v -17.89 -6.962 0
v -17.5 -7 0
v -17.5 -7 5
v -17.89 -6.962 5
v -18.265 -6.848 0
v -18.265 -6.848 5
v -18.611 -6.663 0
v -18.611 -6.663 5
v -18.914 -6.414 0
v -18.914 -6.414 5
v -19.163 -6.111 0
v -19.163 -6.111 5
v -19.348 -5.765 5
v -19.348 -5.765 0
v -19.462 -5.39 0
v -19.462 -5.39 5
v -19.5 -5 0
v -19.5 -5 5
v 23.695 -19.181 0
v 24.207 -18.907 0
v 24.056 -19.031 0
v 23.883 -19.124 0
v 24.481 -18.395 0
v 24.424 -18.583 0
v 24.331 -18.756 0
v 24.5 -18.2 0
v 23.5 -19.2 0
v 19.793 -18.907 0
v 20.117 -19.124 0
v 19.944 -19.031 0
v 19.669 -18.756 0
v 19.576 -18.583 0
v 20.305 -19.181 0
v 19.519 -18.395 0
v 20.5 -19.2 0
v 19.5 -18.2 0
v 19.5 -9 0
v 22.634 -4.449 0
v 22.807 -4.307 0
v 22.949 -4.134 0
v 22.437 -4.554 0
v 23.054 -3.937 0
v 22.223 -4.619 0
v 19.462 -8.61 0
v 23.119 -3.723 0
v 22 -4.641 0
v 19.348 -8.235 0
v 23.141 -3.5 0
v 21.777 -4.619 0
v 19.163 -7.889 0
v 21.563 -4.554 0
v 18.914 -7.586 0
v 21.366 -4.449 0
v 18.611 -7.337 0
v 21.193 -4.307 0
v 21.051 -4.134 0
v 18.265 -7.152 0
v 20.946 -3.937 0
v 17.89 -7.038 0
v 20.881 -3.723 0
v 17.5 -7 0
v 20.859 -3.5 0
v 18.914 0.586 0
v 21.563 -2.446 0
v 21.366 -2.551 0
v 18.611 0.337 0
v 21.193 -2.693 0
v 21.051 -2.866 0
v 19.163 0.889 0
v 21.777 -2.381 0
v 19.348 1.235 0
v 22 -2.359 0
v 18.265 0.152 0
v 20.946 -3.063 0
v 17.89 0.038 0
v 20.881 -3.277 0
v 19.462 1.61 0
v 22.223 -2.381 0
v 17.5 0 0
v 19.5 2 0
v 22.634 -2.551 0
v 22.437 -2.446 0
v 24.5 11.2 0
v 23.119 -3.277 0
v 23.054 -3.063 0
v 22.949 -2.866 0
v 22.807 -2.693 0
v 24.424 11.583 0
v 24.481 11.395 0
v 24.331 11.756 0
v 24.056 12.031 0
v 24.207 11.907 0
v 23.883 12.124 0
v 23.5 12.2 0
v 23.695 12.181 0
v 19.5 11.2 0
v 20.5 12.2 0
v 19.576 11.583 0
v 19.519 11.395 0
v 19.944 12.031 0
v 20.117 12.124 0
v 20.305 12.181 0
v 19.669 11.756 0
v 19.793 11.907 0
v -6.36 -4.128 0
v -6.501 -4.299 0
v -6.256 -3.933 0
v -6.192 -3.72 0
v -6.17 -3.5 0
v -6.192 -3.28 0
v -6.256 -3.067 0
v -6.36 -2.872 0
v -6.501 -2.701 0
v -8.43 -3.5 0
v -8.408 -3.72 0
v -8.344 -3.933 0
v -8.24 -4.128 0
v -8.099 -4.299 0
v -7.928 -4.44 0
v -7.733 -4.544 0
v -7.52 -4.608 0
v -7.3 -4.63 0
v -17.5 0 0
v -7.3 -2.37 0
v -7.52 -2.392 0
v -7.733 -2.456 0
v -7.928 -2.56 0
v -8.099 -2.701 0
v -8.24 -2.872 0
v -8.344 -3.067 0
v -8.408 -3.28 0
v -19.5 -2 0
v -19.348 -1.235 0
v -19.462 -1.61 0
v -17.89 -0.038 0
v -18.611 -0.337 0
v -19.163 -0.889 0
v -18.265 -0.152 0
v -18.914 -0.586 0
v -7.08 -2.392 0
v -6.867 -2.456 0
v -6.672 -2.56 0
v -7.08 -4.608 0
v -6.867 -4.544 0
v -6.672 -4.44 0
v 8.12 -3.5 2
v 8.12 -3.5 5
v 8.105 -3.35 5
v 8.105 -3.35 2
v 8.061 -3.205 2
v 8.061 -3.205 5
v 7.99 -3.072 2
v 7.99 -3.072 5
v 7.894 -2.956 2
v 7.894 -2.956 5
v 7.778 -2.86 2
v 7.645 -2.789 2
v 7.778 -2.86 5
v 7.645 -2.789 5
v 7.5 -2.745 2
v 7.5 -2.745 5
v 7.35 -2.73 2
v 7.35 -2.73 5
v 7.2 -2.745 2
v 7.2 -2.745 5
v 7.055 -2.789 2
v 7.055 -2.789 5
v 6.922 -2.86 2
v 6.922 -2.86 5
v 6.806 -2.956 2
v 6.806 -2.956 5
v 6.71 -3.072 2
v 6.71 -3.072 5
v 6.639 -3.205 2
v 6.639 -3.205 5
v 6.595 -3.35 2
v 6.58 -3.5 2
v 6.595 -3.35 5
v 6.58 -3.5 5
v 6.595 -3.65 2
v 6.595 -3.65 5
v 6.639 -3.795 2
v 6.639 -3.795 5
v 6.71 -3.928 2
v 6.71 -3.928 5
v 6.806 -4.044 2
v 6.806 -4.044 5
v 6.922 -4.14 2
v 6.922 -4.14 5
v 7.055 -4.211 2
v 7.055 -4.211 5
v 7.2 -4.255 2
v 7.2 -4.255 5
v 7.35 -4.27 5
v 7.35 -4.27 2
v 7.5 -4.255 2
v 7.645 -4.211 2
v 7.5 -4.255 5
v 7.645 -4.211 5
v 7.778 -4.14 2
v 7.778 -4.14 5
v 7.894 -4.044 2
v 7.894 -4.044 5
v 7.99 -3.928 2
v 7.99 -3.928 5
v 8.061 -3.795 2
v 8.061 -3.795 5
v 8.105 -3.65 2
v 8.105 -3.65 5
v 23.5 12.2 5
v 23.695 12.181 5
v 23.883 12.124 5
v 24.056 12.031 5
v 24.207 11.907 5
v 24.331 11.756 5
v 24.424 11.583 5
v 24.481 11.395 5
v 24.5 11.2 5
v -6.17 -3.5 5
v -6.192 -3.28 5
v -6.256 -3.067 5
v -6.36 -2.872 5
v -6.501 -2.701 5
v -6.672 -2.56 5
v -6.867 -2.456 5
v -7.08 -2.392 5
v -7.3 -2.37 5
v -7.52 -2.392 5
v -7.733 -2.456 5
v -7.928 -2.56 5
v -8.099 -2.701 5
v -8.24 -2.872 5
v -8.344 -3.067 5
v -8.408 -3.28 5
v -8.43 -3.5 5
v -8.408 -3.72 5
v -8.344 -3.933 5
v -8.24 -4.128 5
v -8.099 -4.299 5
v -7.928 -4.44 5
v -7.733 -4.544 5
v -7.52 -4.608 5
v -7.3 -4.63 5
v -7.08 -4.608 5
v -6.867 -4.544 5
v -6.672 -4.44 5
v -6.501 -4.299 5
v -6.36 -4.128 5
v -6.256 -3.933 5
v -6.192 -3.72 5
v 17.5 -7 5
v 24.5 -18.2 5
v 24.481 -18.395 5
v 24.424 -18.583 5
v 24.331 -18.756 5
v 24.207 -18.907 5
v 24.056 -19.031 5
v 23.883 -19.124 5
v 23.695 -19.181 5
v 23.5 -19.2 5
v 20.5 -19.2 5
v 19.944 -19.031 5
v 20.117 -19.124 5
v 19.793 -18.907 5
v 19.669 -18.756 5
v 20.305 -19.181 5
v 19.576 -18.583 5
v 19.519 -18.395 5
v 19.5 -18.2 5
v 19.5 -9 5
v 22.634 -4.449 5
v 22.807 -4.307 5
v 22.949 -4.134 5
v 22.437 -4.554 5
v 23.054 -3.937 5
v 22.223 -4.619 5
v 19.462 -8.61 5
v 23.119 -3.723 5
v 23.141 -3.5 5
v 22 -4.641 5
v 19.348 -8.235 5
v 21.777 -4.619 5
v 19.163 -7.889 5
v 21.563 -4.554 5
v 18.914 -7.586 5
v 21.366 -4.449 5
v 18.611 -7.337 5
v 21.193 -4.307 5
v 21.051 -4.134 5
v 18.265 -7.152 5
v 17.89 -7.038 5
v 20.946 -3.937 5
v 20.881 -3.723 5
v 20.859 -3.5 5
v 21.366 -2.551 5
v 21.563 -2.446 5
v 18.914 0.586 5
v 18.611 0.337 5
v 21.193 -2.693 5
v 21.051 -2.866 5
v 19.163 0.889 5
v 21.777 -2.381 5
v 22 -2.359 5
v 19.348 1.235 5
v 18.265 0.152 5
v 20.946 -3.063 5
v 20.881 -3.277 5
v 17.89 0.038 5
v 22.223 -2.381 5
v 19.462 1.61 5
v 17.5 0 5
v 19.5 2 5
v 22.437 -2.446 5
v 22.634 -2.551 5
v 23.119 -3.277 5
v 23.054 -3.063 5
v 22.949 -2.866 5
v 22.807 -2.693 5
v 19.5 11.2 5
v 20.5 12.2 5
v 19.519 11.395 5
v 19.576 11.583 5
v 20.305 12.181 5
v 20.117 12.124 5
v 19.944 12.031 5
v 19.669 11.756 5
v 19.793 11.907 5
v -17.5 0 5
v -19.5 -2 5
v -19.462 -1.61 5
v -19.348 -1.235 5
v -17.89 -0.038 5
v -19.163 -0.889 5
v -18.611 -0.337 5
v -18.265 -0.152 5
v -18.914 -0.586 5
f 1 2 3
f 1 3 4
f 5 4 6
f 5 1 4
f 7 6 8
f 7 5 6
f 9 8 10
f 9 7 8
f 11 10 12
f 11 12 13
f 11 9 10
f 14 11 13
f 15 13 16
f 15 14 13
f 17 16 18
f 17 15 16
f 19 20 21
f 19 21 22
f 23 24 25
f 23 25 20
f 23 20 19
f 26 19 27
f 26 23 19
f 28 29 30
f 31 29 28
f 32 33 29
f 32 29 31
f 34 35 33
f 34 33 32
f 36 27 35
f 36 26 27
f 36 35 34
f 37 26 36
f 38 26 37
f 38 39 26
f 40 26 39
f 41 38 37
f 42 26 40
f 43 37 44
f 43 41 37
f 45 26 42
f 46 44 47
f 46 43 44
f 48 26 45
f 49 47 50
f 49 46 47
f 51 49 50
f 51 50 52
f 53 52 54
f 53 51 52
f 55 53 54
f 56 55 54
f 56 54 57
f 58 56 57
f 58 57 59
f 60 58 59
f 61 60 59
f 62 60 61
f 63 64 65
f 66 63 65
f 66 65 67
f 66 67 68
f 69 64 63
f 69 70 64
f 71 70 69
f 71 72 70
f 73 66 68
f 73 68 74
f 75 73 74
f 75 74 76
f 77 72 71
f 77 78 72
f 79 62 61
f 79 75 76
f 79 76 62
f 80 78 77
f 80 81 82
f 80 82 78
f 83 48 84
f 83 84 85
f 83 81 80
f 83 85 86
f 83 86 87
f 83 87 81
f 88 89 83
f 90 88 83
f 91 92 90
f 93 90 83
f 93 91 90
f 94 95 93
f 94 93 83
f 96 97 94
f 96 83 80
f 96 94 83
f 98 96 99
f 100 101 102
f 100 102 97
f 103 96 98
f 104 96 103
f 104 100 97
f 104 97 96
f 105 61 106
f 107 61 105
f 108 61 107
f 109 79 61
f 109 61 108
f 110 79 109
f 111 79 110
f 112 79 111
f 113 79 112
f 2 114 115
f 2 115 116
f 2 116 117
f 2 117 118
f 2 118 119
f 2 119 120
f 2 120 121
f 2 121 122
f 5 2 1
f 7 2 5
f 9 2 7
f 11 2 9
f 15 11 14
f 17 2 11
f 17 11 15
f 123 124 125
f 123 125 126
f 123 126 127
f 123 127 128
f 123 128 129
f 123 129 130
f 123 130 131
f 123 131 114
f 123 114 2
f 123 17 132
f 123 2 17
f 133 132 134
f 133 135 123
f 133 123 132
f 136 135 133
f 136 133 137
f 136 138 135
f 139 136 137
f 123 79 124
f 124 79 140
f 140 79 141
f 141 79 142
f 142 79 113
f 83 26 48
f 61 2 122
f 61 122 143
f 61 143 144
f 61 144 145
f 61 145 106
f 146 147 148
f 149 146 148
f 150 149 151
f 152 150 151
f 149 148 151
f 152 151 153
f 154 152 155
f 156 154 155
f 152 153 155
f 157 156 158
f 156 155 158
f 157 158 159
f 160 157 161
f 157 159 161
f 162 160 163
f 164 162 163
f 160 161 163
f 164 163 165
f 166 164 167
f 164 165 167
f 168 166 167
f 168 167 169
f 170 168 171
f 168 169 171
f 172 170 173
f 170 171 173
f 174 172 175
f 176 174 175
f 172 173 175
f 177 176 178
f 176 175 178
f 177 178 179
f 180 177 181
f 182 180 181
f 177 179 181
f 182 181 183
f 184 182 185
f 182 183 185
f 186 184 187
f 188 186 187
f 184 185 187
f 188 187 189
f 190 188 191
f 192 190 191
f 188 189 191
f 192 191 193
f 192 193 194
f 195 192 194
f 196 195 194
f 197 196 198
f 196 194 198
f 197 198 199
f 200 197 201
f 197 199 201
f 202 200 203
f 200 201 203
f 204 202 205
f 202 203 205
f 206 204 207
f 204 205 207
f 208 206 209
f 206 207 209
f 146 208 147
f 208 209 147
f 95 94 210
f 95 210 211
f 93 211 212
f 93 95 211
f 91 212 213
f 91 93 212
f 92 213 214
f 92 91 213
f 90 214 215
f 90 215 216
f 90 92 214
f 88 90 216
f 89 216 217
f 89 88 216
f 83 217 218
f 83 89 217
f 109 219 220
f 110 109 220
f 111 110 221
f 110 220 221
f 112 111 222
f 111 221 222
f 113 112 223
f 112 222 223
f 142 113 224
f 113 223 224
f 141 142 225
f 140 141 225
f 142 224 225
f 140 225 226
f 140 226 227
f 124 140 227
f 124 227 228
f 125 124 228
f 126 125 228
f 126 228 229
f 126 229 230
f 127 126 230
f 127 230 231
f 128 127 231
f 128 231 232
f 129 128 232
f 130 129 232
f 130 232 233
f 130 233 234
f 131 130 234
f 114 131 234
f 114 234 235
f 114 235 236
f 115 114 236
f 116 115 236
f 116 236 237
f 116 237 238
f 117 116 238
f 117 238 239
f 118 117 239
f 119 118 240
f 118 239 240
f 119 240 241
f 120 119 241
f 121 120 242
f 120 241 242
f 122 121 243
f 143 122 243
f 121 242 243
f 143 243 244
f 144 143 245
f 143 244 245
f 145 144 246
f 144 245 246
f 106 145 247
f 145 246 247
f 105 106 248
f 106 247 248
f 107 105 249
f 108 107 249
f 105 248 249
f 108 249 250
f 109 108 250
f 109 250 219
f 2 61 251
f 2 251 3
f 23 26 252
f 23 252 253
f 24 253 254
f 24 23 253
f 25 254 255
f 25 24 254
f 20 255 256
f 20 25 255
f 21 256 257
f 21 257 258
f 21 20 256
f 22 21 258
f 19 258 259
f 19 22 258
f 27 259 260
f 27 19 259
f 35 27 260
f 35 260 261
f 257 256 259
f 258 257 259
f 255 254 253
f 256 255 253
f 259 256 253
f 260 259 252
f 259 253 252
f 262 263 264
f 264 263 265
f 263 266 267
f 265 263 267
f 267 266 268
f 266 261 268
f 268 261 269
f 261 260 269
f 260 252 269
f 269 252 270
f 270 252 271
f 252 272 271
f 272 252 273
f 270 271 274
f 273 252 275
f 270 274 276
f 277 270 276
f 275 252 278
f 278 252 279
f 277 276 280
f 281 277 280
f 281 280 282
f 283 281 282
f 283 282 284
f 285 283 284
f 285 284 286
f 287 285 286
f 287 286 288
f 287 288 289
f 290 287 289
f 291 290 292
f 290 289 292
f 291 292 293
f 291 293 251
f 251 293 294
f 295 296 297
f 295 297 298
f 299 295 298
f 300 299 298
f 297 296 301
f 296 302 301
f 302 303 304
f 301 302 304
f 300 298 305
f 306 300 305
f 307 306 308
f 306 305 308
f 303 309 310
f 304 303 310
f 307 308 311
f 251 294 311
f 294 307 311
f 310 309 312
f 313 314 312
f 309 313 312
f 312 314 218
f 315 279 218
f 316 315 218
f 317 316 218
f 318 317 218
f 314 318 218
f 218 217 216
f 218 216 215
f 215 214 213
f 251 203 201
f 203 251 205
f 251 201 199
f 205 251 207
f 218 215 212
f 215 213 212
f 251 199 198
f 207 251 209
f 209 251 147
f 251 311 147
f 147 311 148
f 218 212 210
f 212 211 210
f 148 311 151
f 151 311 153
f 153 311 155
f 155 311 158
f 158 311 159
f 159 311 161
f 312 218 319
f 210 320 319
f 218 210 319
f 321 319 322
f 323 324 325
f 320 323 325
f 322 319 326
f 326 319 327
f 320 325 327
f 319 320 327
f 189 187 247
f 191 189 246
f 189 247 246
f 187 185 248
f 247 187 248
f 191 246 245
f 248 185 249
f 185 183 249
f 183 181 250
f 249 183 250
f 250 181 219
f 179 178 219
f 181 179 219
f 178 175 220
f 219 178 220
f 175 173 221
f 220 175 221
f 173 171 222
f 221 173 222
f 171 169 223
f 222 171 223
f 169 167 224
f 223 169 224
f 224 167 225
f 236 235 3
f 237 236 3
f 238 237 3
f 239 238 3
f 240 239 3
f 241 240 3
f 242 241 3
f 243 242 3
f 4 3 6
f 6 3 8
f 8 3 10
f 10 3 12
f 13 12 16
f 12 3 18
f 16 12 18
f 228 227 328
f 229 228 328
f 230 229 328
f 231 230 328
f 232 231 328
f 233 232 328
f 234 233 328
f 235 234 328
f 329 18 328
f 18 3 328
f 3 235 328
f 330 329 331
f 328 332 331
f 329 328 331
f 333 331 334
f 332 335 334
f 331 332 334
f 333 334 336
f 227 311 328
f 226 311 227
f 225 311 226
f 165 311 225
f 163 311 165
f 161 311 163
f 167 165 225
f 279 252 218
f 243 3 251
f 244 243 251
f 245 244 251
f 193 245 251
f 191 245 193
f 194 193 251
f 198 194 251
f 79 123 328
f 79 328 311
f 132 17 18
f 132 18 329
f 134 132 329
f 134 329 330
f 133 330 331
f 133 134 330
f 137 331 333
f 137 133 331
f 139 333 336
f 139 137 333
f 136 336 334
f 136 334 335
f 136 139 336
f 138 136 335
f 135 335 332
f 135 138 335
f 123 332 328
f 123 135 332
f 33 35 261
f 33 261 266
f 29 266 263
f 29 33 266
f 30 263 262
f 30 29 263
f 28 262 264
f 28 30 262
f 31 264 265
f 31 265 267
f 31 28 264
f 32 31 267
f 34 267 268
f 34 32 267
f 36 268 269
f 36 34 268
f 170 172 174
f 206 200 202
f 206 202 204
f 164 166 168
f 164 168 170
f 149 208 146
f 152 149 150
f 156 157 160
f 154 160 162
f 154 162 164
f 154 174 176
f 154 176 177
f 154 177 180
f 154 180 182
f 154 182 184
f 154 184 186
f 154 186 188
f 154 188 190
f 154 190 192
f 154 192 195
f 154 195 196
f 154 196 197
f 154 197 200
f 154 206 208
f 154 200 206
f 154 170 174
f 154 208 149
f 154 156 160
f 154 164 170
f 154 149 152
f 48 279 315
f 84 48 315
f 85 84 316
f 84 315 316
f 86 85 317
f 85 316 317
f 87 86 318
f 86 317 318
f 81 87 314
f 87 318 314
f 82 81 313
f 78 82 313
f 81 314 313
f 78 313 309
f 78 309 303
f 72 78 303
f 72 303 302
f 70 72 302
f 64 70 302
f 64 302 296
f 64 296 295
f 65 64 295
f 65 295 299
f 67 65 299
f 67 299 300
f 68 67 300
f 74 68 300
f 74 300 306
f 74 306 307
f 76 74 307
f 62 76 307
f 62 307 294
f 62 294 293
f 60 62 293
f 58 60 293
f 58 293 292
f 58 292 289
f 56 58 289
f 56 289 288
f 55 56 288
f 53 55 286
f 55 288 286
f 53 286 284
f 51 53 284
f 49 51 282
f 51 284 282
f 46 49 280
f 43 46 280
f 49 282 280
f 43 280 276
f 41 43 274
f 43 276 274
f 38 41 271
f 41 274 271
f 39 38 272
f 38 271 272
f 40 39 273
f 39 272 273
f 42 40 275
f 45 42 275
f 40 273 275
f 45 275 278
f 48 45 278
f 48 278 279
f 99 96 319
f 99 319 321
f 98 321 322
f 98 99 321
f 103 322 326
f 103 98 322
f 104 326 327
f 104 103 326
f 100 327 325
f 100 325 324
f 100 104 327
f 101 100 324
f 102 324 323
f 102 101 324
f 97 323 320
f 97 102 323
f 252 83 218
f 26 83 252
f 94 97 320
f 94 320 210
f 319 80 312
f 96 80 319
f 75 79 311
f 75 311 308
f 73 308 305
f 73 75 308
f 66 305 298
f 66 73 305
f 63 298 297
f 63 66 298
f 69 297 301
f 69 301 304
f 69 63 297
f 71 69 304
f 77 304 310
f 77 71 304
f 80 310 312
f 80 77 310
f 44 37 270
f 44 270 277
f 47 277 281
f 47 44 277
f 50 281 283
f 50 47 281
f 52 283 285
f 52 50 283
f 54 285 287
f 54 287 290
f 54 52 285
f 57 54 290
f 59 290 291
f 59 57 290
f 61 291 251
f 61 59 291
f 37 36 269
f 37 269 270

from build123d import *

# Parameters (mm, degrees)
BOSS_EXTRUDE1_DEPTH = 5
SKETCH2_R           = 1.140983763
SKETCH2_R_2         = 1.130194527
CUT_EXTRUDE1_DEPTH  = 32.526020999
SKETCH3_R           = 0.77
CUT_EXTRUDE2_DEPTH  = 3


with BuildPart() as part:
    # Sketch1 → Boss-Extrude1 (new body)
    with BuildSketch(Plane.XY):
        with BuildLine():
            Line((-17.5, 0), (17.5, 0))
            ThreePointArc((17.5, 0), (18.914213562, 0.585786438), (19.5, 2))
            Line((19.5, 2), (19.5, 11.2))
            ThreePointArc((19.5, 11.2), (19.792893219, 11.907106781), (20.5, 12.2))
            Line((20.5, 12.2), (23.5, 12.2))
            ThreePointArc((23.5, 12.2), (24.207106781, 11.907106781), (24.5, 11.2))
            Line((24.5, 11.2), (24.5, -18.2))
            ThreePointArc((24.5, -18.2), (24.207106781, -18.907106781), (23.5, -19.2))
            Line((23.5, -19.2), (20.5, -19.2))
            ThreePointArc((20.5, -19.2), (19.792893219, -18.907106781), (19.5, -18.2))
            Line((19.5, -18.2), (19.5, -9))
            ThreePointArc((19.5, -9), (18.914213562, -7.585786438), (17.5, -7))
            Line((17.5, -7), (-17.5, -7))
            ThreePointArc((-17.5, -7), (-18.914213562, -6.414213562), (-19.5, -5))
            Line((-19.5, -5), (-19.5, -2))
            ThreePointArc((-19.5, -2), (-18.914213562, -0.585786438), (-17.5, 0))
        make_face()
    extrude(amount=BOSS_EXTRUDE1_DEPTH)

    # Sketch2 → Cut-Extrude1 (cut, through all)
    with BuildSketch(Plane.XY.offset(5)):
        with Locations((22, -3.5)):
            Circle(SKETCH2_R)
        with Locations((-7.3, -3.5)):
            Circle(SKETCH2_R_2)
    extrude(amount=-CUT_EXTRUDE1_DEPTH, mode=Mode.SUBTRACT)

    # Sketch3 → Cut-Extrude2 (cut)
    with BuildSketch(Plane.XY.offset(5)):
        with Locations((7.35, -3.5)):
            Circle(SKETCH3_R)
    extrude(amount=-CUT_EXTRUDE2_DEPTH, mode=Mode.SUBTRACT)


solid = part.part
